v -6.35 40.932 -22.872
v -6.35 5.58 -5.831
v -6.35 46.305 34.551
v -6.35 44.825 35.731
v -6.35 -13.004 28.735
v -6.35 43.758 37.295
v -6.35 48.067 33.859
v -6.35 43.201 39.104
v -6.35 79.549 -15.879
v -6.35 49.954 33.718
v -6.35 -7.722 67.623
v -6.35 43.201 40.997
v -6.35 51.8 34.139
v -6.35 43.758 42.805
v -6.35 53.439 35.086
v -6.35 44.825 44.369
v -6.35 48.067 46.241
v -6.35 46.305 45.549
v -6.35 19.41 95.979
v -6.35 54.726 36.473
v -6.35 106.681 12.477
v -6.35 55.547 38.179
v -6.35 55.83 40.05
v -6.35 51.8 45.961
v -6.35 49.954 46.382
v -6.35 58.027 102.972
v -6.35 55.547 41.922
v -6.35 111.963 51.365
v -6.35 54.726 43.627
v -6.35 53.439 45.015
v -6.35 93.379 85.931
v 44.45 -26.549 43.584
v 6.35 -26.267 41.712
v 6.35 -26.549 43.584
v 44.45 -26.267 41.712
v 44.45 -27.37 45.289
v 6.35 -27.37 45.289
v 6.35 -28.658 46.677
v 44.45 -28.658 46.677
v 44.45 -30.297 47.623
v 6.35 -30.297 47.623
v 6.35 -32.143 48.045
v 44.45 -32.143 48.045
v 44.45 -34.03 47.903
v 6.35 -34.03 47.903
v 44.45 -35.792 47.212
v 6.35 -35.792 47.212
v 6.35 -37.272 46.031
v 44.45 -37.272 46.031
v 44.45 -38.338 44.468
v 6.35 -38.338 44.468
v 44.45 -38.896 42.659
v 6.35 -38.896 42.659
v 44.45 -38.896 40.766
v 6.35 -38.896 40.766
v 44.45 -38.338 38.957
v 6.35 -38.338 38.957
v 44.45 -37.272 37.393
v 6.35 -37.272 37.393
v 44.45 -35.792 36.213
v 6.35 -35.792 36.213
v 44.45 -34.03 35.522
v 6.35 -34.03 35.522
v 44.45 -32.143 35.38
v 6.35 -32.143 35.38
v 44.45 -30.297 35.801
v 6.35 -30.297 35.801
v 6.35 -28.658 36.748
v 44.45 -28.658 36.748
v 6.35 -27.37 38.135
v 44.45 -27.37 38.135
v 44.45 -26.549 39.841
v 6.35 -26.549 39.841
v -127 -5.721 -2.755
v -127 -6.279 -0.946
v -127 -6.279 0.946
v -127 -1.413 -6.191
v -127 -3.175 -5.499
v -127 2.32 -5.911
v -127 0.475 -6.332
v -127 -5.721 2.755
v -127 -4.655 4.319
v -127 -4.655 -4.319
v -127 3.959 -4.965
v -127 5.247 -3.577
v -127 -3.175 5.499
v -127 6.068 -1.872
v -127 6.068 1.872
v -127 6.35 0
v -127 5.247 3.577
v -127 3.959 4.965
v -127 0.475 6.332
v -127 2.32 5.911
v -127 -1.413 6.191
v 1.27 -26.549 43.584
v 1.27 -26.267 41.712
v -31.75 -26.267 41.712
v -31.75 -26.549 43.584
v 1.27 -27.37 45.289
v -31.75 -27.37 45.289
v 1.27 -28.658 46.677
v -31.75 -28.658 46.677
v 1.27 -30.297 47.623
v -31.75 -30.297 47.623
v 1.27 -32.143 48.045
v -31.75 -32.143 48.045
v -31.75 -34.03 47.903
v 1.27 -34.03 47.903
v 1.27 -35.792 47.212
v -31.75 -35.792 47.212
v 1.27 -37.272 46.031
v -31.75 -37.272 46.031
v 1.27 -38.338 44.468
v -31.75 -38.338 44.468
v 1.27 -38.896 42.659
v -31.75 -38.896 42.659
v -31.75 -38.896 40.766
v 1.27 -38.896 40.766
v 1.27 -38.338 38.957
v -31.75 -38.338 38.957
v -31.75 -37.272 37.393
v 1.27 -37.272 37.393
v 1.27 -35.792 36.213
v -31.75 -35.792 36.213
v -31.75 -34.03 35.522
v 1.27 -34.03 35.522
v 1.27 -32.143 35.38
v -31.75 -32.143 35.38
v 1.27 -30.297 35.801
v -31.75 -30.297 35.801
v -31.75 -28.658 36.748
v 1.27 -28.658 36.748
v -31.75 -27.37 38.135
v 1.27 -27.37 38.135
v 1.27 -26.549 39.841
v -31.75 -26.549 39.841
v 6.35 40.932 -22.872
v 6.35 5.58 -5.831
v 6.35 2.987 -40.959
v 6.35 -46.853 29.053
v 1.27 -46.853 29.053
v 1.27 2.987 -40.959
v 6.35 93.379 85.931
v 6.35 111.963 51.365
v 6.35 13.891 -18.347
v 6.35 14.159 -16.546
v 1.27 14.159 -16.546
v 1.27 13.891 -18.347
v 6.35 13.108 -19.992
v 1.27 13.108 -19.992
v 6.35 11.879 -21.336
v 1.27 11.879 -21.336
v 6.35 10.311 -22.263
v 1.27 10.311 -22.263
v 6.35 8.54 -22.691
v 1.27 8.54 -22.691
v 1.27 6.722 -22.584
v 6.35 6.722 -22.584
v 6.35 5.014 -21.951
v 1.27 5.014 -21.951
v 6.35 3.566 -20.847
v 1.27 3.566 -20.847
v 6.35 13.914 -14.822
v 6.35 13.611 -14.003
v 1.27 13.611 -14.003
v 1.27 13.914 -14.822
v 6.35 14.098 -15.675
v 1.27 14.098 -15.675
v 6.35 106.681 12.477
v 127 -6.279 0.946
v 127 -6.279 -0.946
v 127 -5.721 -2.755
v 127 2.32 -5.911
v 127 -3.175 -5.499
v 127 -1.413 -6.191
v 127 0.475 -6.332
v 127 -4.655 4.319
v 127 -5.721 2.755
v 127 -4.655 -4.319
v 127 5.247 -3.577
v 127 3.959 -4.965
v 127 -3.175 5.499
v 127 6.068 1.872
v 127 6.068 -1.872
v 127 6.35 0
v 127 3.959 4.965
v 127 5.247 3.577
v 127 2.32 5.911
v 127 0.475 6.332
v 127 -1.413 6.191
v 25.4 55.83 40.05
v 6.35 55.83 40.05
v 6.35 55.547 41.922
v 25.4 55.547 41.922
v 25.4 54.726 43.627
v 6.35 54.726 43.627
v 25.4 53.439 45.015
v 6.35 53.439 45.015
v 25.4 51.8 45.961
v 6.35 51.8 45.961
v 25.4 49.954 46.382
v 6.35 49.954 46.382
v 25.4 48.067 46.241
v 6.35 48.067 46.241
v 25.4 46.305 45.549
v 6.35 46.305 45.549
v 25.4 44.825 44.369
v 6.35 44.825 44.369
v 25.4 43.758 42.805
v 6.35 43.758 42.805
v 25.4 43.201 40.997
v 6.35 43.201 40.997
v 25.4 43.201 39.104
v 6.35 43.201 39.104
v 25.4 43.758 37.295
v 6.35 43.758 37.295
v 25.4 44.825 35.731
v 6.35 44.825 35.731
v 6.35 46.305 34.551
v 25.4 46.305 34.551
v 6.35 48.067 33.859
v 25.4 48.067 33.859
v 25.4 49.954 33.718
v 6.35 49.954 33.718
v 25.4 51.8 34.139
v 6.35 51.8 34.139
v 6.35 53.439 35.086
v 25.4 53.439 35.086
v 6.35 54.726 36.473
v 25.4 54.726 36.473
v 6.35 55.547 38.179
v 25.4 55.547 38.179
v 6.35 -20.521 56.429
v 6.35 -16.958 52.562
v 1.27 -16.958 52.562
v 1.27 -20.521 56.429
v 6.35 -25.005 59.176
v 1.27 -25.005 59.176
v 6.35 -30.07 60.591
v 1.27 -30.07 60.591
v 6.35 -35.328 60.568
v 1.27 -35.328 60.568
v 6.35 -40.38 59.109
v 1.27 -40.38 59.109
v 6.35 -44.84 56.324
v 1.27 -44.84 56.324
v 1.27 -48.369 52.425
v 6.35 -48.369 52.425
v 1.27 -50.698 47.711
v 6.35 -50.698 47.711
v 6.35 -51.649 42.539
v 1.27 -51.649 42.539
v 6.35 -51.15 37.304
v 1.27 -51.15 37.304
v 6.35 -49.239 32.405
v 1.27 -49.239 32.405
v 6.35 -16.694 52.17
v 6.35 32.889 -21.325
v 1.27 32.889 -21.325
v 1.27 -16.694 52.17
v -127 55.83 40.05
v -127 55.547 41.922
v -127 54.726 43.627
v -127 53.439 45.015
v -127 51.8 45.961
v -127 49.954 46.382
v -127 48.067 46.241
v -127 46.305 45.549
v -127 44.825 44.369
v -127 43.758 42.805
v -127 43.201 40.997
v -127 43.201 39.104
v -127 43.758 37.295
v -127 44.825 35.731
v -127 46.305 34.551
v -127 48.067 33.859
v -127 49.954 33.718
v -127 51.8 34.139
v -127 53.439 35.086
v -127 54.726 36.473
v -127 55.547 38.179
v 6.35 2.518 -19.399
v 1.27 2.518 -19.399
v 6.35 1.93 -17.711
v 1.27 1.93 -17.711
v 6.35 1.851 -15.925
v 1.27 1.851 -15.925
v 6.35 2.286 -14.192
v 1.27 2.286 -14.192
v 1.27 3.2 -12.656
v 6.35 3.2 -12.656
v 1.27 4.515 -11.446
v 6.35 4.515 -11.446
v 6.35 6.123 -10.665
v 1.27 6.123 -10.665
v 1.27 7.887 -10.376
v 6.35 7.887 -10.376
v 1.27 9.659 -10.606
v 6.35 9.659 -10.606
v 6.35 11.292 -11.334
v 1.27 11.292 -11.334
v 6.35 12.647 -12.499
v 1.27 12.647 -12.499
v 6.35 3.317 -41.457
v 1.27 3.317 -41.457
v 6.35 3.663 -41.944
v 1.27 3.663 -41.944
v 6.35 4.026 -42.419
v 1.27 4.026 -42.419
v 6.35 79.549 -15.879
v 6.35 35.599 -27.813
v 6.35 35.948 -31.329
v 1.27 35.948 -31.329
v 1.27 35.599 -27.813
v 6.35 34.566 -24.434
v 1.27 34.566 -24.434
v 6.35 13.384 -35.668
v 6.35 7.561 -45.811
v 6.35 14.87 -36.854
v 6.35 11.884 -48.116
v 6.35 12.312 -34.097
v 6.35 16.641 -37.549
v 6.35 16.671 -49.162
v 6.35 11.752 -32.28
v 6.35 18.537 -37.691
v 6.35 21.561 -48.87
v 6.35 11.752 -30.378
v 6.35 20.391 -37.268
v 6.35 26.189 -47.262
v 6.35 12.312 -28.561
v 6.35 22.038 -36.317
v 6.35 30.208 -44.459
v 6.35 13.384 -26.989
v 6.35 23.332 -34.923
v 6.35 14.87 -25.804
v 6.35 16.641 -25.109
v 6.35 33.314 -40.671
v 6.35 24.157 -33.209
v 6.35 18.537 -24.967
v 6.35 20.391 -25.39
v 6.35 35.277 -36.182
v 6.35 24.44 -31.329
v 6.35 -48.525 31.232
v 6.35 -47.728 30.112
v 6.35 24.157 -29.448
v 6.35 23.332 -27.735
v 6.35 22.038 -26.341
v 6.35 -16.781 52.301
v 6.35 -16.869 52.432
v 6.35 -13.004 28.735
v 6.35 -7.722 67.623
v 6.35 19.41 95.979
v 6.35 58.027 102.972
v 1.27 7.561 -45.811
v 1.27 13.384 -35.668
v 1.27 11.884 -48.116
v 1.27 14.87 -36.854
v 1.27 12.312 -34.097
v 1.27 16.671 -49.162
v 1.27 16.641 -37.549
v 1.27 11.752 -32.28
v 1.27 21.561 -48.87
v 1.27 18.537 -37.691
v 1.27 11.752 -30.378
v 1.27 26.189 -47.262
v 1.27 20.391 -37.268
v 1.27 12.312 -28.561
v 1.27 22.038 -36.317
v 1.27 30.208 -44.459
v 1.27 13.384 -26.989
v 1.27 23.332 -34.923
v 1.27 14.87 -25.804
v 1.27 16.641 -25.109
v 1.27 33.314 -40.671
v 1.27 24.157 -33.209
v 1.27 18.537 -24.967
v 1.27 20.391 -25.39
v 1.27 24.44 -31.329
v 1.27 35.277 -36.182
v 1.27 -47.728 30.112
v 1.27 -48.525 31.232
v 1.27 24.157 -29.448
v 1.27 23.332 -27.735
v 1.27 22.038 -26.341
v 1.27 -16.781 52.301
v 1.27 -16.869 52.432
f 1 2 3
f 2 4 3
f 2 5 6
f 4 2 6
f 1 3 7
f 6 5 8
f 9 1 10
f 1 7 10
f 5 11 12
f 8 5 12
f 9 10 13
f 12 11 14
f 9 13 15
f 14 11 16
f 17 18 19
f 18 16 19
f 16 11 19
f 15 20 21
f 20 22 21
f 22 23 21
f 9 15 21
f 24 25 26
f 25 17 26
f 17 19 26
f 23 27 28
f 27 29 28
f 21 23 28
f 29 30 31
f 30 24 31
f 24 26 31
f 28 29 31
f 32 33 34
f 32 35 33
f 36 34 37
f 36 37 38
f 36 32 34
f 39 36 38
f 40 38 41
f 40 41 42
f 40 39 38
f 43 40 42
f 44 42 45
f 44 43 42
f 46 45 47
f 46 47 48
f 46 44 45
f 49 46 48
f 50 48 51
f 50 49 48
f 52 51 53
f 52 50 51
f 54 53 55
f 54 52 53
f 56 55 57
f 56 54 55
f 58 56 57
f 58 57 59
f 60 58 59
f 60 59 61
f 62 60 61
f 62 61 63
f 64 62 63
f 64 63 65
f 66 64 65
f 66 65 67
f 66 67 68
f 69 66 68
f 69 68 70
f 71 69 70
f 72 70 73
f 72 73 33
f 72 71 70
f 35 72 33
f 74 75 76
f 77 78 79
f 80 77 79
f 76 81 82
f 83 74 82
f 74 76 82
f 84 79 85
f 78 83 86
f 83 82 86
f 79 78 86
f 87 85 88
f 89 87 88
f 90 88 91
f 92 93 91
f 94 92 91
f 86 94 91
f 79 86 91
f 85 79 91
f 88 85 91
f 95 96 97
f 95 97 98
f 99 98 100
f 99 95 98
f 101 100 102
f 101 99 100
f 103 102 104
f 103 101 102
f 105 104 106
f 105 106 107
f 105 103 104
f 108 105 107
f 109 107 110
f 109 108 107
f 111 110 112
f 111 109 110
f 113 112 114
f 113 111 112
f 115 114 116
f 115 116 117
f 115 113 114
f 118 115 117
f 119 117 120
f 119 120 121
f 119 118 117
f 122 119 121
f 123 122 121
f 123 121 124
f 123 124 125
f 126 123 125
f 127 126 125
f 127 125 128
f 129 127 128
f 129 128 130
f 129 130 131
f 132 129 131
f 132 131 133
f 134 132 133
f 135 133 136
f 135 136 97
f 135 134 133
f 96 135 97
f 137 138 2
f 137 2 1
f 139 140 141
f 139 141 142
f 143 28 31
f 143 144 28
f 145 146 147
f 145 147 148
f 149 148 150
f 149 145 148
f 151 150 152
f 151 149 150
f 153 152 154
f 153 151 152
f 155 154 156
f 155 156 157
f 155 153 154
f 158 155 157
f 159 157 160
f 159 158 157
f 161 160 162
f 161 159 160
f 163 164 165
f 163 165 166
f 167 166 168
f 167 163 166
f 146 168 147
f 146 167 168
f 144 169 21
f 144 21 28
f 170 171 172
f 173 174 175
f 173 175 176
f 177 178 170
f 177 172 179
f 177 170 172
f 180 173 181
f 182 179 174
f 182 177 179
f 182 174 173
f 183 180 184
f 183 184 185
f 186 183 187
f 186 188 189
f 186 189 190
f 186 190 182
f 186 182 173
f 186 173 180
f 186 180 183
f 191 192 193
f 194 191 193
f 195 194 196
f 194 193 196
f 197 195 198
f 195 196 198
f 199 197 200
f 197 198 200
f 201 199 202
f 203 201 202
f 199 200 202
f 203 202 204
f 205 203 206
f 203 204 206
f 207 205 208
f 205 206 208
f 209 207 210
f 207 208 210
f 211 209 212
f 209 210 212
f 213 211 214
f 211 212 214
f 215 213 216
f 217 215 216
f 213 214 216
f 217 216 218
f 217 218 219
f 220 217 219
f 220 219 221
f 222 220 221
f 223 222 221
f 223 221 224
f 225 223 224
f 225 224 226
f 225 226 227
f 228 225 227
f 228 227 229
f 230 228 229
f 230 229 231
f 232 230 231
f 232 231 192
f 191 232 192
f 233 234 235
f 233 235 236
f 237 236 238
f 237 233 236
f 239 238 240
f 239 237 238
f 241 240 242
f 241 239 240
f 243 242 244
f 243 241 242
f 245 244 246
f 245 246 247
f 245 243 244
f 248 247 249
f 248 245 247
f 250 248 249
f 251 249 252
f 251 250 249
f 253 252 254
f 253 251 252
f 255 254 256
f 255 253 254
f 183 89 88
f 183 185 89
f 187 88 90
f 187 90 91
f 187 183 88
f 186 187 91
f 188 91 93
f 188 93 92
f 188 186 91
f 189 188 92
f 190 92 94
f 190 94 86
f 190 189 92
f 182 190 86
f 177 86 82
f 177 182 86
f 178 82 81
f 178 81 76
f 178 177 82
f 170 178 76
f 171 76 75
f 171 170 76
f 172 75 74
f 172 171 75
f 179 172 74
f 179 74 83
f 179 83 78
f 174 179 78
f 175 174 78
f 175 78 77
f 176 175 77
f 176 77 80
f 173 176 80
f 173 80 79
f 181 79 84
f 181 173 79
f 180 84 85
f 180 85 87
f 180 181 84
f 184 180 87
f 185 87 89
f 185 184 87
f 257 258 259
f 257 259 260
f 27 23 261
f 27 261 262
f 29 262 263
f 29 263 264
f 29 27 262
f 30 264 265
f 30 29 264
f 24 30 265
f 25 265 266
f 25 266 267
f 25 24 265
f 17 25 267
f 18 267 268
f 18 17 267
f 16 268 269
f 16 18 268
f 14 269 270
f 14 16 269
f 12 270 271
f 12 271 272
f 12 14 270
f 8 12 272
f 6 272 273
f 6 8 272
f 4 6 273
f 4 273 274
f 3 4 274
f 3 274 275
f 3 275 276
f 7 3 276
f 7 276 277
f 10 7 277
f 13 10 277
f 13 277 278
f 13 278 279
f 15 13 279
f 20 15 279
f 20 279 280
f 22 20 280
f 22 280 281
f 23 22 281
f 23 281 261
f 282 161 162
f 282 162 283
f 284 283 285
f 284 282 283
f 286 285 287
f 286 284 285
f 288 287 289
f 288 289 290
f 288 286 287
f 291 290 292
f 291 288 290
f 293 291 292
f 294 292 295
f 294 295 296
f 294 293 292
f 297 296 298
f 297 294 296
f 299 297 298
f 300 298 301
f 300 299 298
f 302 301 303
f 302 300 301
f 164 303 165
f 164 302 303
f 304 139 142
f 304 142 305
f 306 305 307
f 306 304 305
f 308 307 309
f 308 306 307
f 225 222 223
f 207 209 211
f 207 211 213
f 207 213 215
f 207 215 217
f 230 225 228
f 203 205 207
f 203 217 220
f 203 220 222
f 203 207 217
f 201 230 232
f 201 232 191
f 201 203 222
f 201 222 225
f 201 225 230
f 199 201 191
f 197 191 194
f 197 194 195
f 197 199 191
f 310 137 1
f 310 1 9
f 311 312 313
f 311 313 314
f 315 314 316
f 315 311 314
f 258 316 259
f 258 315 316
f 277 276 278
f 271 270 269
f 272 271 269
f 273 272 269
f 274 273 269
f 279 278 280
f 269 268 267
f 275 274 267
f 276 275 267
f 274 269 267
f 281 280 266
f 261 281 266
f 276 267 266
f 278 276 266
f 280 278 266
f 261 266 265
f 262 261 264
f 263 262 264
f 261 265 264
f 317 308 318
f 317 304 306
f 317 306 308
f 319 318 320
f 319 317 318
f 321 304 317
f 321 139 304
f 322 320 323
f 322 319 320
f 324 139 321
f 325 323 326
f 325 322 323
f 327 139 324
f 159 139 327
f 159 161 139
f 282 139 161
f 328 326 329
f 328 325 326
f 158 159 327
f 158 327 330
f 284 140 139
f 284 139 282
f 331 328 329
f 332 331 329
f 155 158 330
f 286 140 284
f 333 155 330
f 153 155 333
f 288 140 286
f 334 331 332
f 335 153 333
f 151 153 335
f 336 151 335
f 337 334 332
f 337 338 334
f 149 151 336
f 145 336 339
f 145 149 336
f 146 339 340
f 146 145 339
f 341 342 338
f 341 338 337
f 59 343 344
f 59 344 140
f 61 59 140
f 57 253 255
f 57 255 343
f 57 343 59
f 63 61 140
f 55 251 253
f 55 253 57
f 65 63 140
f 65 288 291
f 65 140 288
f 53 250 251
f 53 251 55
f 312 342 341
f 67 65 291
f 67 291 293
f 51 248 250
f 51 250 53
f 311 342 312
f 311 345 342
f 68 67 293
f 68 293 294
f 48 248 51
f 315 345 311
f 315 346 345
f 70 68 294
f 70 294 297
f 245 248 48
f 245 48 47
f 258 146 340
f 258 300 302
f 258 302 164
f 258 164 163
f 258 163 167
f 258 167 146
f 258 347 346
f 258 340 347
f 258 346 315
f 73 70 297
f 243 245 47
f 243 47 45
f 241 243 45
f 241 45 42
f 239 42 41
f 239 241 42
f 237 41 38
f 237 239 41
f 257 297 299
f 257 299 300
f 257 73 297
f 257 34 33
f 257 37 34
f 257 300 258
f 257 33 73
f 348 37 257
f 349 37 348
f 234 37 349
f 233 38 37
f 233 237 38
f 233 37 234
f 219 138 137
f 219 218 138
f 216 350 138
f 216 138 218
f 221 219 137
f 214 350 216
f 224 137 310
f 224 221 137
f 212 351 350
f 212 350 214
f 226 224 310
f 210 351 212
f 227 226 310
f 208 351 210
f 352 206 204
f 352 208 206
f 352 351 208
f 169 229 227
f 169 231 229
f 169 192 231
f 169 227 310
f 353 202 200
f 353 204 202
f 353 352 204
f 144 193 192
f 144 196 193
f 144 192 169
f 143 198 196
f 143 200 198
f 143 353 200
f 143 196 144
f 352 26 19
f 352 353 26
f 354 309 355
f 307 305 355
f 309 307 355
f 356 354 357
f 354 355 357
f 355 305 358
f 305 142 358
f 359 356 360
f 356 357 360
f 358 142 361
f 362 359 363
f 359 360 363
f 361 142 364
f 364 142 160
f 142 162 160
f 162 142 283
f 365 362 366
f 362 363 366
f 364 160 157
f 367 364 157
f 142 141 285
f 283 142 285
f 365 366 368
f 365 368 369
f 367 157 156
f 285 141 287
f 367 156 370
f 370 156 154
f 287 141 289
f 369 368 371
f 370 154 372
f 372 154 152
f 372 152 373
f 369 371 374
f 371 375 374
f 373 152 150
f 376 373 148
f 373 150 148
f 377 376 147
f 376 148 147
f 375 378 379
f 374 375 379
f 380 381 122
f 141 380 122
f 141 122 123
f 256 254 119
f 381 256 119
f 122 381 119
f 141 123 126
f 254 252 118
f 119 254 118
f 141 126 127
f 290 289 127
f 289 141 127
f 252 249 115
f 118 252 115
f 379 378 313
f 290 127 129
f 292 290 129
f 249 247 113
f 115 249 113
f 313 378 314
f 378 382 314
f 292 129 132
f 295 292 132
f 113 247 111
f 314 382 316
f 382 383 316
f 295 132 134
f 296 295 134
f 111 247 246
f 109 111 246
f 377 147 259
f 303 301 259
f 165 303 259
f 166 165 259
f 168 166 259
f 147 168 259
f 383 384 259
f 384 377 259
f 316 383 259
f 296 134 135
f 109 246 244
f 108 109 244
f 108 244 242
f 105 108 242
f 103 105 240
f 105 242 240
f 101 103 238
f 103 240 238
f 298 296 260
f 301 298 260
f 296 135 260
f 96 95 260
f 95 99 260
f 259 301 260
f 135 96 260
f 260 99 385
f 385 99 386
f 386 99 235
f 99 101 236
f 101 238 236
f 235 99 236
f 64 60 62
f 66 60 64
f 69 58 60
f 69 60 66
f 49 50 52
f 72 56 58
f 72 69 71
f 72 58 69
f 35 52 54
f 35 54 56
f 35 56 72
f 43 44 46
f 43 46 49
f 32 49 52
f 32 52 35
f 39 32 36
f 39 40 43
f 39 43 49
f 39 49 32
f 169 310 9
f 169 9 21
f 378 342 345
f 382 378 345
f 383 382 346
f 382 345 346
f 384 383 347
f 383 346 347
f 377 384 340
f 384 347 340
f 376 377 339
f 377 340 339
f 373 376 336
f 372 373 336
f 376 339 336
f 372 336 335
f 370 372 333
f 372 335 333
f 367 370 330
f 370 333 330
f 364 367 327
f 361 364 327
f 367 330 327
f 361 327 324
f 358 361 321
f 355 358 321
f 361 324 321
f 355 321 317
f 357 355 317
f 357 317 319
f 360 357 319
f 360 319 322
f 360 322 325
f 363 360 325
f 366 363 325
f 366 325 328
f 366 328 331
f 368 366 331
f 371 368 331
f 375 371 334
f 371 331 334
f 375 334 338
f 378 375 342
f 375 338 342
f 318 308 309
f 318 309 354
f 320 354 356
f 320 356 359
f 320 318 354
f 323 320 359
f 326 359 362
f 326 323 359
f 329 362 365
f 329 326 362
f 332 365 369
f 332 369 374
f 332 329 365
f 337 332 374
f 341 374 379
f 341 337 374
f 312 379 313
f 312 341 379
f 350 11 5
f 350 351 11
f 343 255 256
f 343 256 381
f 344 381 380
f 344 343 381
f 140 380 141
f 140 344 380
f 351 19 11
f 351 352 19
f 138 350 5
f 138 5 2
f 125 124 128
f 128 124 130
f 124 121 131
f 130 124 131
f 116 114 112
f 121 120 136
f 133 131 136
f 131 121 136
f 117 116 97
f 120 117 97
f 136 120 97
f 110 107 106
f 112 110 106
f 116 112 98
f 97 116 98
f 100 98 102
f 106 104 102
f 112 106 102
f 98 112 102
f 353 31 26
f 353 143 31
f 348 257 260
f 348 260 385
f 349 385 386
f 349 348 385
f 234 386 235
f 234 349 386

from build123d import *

# Parameters (mm, degrees)
F0_R     = 6.35
F1_DEPTH = 127
F3_R     = 6.35
F4_DEPTH = 6.35
F5_DEPTH = 25.4
F6_DEPTH = 127
F7_R     = 6.379813
F7_R_2   = 6.35
F8_DEPTH = 5.08
F9_DEPTH = 38.1


with BuildPart() as f1:
    # F0 (on Right) → F1 (new body, symmetric)
    with BuildSketch(Plane.YZ):
        Circle(F0_R)
    extrude(amount=F1_DEPTH, both=True)


with BuildPart() as f4:
    # F3 (on face) → F4 (new body, symmetric)
    with BuildSketch(Plane.YZ):
        Polygon((-7.721509, 67.623428), (-13.004192, 28.735438), (5.579814, -5.830689), (40.932051, -22.871869), (79.549165, -15.878949), (106.680732, 12.477012), (111.963415, 51.365001), (93.379409, 85.931128), (58.027172, 102.972308), (19.410057, 95.979389), align=None)
        with Locations((49.479611, 40.05022)):
            Circle(F3_R, mode=Mode.SUBTRACT)
    extrude(amount=F4_DEPTH, both=True)

    # F3 (on face) → F5 (join)
    with BuildSketch(Plane.YZ):
        with Locations((49.479611, 40.05022)):
            Circle(F3_R)
    extrude(amount=F5_DEPTH)

    # F3 (on face) → F6 (join)
    with BuildSketch(Plane.YZ):
        with Locations((49.479611, 40.05022)):
            Circle(F3_R)
    extrude(amount=-F6_DEPTH)


with BuildPart() as f8:
    # F7 (on face) → F8 (new body)
    with BuildSketch(Plane.YZ.offset(6.35)):
        with BuildLine():
            ThreePointArc((4.025923, -42.419214), (23.930694, -48.225583), (35.947851, -31.328785))
            ThreePointArc((35.947851, -31.328785), (35.166007, -26.098183), (32.888821, -21.324829))
            ThreePointArc((32.888821, -21.324829), (24.411281, -14.606692), (13.611369, -14.003391))
            ThreePointArc((13.611369, -14.003391), (14.020909, -15.245362), (14.159497, -16.54575))
            ThreePointArc((14.159497, -16.54575), (10.310534, -22.262626), (3.565658, -20.847055))
            ThreePointArc((3.565658, -20.847055), (0.180255, -30.814046), (2.98666, -40.959289))
            Line((2.98666, -40.959289), (4.025923, -42.419214))
        make_face()
        with Locations((18.060349, -31.328785)):
            Circle(F7_R, mode=Mode.SUBTRACT)
        with BuildLine():
            ThreePointArc((13.611369, -14.003391), (24.411281, -14.606692), (32.888821, -21.324829))
            Line((32.888821, -21.324829), (-16.693883, 52.169673))
            ThreePointArc((-16.693883, 52.169673), (-14.365494, 47.169757), (-13.567054, 41.712373))
            ThreePointArc((-13.567054, 41.712373), (-25.845165, 23.906643), (-46.852516, 29.053221))
            Line((-46.852516, 29.053221), (2.98666, -40.959289))
            ThreePointArc((2.98666, -40.959289), (0.180255, -30.814046), (3.565658, -20.847055))
            ThreePointArc((3.565658, -20.847055), (4.515481, -11.446481), (13.611369, -14.003391))
        make_face()
        with BuildLine():
            ThreePointArc((2.98666, -40.959289), (3.487997, -41.702274), (4.025923, -42.419214))
            Line((4.025923, -42.419214), (2.98666, -40.959289))
        make_face()
        with BuildLine():
            Line((-16.958326, 52.561646), (-16.693883, 52.169673))
            ThreePointArc((-16.693883, 52.169673), (-16.824889, 52.36648), (-16.958326, 52.561646))
        make_face()
        with BuildLine():
            ThreePointArc((-13.567054, 41.712373), (-14.365494, 47.169757), (-16.693883, 52.169673))
            Line((-16.693883, 52.169673), (-16.958326, 52.561646))
            ThreePointArc((-16.958326, 52.561646), (-42.706648, 57.871043), (-49.23884, 32.405454))
            Line((-49.23884, 32.405454), (-46.852516, 29.053221))
            ThreePointArc((-46.852516, 29.053221), (-25.845165, 23.906643), (-13.567054, 41.712373))
        make_face()
        with Locations((-32.617054, 41.712373)):
            Circle(F7_R_2, mode=Mode.SUBTRACT)
        with BuildLine():
            ThreePointArc((-49.23884, 32.405454), (-48.136455, 30.664717), (-46.852516, 29.053221))
            Line((-46.852516, 29.053221), (-49.23884, 32.405454))
        make_face()
    extrude(amount=-F8_DEPTH)

    # F7 (on face) → F9 (join, symmetric)
    with BuildSketch(Plane.YZ.offset(6.35)):
        with Locations((-32.617054, 41.712373)):
            Circle(F7_R_2)
    extrude(amount=F9_DEPTH, both=True)


solid = Compound([f1.part, f4.part, f8.part])
